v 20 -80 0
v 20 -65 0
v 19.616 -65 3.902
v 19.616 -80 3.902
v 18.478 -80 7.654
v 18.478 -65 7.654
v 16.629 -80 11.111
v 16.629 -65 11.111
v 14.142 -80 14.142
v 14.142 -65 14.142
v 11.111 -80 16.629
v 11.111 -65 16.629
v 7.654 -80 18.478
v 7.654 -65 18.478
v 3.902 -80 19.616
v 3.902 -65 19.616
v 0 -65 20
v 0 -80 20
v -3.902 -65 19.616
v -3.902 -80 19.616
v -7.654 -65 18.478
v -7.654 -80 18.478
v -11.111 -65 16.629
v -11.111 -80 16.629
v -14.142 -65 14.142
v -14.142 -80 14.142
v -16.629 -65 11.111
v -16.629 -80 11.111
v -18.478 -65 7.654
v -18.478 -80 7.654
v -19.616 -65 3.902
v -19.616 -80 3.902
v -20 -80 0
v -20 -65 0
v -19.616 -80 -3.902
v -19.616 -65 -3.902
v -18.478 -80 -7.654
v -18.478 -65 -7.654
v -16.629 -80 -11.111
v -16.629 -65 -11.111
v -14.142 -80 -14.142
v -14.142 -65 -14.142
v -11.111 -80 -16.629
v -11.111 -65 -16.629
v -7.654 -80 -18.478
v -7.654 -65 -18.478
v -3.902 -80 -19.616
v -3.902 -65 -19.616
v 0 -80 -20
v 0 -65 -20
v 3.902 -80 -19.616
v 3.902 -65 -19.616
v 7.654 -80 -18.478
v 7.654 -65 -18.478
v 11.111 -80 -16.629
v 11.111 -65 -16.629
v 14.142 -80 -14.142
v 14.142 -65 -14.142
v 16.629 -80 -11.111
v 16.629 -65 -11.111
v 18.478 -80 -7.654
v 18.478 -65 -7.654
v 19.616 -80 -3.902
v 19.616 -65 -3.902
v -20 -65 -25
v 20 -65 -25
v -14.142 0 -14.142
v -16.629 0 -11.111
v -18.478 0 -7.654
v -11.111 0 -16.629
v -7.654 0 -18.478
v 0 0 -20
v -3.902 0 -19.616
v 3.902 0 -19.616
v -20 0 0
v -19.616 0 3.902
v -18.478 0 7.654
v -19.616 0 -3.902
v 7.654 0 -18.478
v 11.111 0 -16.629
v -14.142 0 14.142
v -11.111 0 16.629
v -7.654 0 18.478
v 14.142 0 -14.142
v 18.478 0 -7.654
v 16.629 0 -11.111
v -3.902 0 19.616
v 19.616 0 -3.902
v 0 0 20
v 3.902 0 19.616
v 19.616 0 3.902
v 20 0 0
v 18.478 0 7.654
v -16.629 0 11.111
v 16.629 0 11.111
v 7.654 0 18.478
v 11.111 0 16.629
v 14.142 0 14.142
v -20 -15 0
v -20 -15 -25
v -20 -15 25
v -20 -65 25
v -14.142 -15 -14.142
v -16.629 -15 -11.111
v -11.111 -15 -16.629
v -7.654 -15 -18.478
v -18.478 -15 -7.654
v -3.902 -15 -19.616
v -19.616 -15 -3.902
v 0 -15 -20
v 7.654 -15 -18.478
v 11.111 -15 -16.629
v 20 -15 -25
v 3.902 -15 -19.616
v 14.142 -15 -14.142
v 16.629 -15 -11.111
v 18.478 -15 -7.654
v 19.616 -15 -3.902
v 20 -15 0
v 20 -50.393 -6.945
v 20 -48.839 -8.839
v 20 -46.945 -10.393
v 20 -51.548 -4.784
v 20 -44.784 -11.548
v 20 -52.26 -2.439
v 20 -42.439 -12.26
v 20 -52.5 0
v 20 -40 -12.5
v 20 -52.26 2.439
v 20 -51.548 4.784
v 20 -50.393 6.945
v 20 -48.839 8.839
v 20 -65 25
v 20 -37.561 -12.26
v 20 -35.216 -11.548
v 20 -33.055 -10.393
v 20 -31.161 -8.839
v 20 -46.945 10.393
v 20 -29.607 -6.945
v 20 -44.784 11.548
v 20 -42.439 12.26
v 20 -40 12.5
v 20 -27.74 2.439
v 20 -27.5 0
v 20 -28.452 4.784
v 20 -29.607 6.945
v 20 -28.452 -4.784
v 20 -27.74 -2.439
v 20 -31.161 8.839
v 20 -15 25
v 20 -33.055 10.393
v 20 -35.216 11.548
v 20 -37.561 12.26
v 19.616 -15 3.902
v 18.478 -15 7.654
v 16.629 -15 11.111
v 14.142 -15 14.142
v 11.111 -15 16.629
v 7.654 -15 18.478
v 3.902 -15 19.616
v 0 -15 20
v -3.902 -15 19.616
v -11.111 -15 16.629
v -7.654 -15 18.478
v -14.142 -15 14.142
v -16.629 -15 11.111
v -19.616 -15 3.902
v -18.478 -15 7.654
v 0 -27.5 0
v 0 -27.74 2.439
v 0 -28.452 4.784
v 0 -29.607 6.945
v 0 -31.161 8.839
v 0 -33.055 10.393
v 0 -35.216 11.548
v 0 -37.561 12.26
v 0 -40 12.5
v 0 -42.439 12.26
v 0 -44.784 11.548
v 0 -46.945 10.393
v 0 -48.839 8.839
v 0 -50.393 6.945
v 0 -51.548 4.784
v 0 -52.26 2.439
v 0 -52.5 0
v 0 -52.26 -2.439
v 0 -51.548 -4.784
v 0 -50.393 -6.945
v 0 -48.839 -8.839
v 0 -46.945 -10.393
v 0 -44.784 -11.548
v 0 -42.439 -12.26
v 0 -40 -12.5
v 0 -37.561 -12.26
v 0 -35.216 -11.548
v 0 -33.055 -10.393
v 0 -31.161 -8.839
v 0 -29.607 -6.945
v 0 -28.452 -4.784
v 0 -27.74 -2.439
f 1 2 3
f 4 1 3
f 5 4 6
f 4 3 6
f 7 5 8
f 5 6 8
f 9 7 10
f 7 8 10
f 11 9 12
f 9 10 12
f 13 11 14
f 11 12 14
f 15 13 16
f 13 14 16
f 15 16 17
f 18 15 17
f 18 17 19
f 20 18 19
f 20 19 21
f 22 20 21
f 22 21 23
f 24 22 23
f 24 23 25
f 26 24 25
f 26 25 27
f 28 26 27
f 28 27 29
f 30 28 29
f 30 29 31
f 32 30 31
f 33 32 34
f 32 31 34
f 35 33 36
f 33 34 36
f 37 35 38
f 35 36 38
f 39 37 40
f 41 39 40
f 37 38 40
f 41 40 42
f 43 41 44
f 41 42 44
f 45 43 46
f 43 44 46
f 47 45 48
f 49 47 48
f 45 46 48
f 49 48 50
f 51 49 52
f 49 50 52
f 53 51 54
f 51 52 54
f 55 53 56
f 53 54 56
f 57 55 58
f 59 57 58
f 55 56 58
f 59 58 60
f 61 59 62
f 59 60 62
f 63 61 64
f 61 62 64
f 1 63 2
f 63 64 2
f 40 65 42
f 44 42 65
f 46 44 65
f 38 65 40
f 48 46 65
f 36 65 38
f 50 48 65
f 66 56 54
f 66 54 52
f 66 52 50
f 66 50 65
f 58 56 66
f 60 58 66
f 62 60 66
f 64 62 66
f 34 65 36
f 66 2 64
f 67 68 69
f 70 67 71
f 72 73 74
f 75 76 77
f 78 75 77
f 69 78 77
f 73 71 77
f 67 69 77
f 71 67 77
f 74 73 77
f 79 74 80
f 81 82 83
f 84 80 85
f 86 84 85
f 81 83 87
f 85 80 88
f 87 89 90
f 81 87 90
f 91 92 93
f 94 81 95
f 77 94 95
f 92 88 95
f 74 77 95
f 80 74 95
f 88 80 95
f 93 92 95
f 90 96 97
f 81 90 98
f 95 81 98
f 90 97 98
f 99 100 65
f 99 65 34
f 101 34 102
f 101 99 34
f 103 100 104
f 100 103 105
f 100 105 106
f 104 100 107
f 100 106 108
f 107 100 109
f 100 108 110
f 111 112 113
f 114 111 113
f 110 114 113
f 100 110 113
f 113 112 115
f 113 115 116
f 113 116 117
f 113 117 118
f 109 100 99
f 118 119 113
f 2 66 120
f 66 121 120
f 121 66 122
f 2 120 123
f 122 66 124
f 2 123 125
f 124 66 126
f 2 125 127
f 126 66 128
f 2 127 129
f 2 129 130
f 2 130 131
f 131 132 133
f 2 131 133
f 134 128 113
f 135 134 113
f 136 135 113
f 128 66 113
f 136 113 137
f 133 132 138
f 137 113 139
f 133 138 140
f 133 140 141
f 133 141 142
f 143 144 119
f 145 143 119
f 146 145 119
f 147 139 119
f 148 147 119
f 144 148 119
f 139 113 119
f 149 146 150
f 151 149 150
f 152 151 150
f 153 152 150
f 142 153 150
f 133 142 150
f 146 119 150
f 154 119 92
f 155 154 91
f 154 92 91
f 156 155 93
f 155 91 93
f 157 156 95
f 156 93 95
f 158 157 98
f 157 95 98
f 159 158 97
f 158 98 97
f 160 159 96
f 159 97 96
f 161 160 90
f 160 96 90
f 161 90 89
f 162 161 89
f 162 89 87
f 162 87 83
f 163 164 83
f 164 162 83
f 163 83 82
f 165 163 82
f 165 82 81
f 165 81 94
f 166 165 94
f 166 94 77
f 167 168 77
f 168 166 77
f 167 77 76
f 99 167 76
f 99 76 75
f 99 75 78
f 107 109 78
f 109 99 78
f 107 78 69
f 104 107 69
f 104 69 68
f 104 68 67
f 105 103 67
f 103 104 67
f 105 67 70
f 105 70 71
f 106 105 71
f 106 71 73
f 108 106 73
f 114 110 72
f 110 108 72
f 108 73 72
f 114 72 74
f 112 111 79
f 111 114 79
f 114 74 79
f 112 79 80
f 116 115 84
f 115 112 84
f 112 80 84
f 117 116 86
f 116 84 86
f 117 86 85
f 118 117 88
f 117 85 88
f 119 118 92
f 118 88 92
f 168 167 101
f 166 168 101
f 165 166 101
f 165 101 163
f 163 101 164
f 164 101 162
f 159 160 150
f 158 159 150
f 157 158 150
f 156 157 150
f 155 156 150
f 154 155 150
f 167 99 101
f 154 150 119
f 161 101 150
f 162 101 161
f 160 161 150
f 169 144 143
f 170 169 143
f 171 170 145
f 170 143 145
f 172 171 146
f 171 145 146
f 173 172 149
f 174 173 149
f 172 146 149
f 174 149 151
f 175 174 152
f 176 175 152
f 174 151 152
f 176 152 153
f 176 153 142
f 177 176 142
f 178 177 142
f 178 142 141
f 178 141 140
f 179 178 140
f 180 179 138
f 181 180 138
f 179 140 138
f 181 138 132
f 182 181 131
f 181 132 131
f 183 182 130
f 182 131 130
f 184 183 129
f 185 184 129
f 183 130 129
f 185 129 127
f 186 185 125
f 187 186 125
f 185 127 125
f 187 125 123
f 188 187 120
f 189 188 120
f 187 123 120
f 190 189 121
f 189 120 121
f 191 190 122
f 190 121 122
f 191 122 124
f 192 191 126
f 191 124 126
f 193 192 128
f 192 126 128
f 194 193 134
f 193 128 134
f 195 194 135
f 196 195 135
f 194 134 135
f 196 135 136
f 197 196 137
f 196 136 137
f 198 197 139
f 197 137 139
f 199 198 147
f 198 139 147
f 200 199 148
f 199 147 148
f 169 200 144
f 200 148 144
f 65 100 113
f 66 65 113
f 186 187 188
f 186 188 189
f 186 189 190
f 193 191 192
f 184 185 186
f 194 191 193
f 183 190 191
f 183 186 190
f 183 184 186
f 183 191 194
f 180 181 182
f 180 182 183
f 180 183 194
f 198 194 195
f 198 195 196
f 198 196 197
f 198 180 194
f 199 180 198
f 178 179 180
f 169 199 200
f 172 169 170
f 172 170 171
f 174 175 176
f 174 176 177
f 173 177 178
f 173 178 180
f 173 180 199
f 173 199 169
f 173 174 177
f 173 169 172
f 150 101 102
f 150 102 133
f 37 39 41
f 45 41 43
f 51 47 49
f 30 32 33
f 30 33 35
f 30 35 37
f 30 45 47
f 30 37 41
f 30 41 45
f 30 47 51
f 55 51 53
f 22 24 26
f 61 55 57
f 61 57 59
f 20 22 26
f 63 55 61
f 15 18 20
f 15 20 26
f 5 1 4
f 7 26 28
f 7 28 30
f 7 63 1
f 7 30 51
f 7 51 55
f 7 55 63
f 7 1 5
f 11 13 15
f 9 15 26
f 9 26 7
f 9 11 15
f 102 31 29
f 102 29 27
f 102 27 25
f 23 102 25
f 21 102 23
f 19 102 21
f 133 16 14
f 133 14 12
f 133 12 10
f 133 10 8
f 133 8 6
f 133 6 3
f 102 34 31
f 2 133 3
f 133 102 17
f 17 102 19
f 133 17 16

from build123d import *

# Parameters (mm, degrees)
F0_R     = 20
F1_DEPTH = 80
F3_W     = 40
F3_H     = 50
F4_DEPTH = 50
F5_R     = 12.5
F6_DEPTH = 20


with BuildPart() as f1:
    # F0 (on Front) → F1 (new body)
    with BuildSketch(Plane.XZ):
        Circle(F0_R)
    extrude(amount=F1_DEPTH)

    # F3 (on offset) → F4 (join)
    with BuildSketch(Plane.XZ.offset(15)):
        Rectangle(F3_W, F3_H)
    extrude(amount=F4_DEPTH)

    # F5 (on face) → F6 (cut)
    with BuildSketch(Plane.YZ.offset(20)):
        with Locations((-40, 0)):
            Circle(F5_R)
    extrude(amount=-F6_DEPTH, mode=Mode.SUBTRACT)


solid = f1.part
